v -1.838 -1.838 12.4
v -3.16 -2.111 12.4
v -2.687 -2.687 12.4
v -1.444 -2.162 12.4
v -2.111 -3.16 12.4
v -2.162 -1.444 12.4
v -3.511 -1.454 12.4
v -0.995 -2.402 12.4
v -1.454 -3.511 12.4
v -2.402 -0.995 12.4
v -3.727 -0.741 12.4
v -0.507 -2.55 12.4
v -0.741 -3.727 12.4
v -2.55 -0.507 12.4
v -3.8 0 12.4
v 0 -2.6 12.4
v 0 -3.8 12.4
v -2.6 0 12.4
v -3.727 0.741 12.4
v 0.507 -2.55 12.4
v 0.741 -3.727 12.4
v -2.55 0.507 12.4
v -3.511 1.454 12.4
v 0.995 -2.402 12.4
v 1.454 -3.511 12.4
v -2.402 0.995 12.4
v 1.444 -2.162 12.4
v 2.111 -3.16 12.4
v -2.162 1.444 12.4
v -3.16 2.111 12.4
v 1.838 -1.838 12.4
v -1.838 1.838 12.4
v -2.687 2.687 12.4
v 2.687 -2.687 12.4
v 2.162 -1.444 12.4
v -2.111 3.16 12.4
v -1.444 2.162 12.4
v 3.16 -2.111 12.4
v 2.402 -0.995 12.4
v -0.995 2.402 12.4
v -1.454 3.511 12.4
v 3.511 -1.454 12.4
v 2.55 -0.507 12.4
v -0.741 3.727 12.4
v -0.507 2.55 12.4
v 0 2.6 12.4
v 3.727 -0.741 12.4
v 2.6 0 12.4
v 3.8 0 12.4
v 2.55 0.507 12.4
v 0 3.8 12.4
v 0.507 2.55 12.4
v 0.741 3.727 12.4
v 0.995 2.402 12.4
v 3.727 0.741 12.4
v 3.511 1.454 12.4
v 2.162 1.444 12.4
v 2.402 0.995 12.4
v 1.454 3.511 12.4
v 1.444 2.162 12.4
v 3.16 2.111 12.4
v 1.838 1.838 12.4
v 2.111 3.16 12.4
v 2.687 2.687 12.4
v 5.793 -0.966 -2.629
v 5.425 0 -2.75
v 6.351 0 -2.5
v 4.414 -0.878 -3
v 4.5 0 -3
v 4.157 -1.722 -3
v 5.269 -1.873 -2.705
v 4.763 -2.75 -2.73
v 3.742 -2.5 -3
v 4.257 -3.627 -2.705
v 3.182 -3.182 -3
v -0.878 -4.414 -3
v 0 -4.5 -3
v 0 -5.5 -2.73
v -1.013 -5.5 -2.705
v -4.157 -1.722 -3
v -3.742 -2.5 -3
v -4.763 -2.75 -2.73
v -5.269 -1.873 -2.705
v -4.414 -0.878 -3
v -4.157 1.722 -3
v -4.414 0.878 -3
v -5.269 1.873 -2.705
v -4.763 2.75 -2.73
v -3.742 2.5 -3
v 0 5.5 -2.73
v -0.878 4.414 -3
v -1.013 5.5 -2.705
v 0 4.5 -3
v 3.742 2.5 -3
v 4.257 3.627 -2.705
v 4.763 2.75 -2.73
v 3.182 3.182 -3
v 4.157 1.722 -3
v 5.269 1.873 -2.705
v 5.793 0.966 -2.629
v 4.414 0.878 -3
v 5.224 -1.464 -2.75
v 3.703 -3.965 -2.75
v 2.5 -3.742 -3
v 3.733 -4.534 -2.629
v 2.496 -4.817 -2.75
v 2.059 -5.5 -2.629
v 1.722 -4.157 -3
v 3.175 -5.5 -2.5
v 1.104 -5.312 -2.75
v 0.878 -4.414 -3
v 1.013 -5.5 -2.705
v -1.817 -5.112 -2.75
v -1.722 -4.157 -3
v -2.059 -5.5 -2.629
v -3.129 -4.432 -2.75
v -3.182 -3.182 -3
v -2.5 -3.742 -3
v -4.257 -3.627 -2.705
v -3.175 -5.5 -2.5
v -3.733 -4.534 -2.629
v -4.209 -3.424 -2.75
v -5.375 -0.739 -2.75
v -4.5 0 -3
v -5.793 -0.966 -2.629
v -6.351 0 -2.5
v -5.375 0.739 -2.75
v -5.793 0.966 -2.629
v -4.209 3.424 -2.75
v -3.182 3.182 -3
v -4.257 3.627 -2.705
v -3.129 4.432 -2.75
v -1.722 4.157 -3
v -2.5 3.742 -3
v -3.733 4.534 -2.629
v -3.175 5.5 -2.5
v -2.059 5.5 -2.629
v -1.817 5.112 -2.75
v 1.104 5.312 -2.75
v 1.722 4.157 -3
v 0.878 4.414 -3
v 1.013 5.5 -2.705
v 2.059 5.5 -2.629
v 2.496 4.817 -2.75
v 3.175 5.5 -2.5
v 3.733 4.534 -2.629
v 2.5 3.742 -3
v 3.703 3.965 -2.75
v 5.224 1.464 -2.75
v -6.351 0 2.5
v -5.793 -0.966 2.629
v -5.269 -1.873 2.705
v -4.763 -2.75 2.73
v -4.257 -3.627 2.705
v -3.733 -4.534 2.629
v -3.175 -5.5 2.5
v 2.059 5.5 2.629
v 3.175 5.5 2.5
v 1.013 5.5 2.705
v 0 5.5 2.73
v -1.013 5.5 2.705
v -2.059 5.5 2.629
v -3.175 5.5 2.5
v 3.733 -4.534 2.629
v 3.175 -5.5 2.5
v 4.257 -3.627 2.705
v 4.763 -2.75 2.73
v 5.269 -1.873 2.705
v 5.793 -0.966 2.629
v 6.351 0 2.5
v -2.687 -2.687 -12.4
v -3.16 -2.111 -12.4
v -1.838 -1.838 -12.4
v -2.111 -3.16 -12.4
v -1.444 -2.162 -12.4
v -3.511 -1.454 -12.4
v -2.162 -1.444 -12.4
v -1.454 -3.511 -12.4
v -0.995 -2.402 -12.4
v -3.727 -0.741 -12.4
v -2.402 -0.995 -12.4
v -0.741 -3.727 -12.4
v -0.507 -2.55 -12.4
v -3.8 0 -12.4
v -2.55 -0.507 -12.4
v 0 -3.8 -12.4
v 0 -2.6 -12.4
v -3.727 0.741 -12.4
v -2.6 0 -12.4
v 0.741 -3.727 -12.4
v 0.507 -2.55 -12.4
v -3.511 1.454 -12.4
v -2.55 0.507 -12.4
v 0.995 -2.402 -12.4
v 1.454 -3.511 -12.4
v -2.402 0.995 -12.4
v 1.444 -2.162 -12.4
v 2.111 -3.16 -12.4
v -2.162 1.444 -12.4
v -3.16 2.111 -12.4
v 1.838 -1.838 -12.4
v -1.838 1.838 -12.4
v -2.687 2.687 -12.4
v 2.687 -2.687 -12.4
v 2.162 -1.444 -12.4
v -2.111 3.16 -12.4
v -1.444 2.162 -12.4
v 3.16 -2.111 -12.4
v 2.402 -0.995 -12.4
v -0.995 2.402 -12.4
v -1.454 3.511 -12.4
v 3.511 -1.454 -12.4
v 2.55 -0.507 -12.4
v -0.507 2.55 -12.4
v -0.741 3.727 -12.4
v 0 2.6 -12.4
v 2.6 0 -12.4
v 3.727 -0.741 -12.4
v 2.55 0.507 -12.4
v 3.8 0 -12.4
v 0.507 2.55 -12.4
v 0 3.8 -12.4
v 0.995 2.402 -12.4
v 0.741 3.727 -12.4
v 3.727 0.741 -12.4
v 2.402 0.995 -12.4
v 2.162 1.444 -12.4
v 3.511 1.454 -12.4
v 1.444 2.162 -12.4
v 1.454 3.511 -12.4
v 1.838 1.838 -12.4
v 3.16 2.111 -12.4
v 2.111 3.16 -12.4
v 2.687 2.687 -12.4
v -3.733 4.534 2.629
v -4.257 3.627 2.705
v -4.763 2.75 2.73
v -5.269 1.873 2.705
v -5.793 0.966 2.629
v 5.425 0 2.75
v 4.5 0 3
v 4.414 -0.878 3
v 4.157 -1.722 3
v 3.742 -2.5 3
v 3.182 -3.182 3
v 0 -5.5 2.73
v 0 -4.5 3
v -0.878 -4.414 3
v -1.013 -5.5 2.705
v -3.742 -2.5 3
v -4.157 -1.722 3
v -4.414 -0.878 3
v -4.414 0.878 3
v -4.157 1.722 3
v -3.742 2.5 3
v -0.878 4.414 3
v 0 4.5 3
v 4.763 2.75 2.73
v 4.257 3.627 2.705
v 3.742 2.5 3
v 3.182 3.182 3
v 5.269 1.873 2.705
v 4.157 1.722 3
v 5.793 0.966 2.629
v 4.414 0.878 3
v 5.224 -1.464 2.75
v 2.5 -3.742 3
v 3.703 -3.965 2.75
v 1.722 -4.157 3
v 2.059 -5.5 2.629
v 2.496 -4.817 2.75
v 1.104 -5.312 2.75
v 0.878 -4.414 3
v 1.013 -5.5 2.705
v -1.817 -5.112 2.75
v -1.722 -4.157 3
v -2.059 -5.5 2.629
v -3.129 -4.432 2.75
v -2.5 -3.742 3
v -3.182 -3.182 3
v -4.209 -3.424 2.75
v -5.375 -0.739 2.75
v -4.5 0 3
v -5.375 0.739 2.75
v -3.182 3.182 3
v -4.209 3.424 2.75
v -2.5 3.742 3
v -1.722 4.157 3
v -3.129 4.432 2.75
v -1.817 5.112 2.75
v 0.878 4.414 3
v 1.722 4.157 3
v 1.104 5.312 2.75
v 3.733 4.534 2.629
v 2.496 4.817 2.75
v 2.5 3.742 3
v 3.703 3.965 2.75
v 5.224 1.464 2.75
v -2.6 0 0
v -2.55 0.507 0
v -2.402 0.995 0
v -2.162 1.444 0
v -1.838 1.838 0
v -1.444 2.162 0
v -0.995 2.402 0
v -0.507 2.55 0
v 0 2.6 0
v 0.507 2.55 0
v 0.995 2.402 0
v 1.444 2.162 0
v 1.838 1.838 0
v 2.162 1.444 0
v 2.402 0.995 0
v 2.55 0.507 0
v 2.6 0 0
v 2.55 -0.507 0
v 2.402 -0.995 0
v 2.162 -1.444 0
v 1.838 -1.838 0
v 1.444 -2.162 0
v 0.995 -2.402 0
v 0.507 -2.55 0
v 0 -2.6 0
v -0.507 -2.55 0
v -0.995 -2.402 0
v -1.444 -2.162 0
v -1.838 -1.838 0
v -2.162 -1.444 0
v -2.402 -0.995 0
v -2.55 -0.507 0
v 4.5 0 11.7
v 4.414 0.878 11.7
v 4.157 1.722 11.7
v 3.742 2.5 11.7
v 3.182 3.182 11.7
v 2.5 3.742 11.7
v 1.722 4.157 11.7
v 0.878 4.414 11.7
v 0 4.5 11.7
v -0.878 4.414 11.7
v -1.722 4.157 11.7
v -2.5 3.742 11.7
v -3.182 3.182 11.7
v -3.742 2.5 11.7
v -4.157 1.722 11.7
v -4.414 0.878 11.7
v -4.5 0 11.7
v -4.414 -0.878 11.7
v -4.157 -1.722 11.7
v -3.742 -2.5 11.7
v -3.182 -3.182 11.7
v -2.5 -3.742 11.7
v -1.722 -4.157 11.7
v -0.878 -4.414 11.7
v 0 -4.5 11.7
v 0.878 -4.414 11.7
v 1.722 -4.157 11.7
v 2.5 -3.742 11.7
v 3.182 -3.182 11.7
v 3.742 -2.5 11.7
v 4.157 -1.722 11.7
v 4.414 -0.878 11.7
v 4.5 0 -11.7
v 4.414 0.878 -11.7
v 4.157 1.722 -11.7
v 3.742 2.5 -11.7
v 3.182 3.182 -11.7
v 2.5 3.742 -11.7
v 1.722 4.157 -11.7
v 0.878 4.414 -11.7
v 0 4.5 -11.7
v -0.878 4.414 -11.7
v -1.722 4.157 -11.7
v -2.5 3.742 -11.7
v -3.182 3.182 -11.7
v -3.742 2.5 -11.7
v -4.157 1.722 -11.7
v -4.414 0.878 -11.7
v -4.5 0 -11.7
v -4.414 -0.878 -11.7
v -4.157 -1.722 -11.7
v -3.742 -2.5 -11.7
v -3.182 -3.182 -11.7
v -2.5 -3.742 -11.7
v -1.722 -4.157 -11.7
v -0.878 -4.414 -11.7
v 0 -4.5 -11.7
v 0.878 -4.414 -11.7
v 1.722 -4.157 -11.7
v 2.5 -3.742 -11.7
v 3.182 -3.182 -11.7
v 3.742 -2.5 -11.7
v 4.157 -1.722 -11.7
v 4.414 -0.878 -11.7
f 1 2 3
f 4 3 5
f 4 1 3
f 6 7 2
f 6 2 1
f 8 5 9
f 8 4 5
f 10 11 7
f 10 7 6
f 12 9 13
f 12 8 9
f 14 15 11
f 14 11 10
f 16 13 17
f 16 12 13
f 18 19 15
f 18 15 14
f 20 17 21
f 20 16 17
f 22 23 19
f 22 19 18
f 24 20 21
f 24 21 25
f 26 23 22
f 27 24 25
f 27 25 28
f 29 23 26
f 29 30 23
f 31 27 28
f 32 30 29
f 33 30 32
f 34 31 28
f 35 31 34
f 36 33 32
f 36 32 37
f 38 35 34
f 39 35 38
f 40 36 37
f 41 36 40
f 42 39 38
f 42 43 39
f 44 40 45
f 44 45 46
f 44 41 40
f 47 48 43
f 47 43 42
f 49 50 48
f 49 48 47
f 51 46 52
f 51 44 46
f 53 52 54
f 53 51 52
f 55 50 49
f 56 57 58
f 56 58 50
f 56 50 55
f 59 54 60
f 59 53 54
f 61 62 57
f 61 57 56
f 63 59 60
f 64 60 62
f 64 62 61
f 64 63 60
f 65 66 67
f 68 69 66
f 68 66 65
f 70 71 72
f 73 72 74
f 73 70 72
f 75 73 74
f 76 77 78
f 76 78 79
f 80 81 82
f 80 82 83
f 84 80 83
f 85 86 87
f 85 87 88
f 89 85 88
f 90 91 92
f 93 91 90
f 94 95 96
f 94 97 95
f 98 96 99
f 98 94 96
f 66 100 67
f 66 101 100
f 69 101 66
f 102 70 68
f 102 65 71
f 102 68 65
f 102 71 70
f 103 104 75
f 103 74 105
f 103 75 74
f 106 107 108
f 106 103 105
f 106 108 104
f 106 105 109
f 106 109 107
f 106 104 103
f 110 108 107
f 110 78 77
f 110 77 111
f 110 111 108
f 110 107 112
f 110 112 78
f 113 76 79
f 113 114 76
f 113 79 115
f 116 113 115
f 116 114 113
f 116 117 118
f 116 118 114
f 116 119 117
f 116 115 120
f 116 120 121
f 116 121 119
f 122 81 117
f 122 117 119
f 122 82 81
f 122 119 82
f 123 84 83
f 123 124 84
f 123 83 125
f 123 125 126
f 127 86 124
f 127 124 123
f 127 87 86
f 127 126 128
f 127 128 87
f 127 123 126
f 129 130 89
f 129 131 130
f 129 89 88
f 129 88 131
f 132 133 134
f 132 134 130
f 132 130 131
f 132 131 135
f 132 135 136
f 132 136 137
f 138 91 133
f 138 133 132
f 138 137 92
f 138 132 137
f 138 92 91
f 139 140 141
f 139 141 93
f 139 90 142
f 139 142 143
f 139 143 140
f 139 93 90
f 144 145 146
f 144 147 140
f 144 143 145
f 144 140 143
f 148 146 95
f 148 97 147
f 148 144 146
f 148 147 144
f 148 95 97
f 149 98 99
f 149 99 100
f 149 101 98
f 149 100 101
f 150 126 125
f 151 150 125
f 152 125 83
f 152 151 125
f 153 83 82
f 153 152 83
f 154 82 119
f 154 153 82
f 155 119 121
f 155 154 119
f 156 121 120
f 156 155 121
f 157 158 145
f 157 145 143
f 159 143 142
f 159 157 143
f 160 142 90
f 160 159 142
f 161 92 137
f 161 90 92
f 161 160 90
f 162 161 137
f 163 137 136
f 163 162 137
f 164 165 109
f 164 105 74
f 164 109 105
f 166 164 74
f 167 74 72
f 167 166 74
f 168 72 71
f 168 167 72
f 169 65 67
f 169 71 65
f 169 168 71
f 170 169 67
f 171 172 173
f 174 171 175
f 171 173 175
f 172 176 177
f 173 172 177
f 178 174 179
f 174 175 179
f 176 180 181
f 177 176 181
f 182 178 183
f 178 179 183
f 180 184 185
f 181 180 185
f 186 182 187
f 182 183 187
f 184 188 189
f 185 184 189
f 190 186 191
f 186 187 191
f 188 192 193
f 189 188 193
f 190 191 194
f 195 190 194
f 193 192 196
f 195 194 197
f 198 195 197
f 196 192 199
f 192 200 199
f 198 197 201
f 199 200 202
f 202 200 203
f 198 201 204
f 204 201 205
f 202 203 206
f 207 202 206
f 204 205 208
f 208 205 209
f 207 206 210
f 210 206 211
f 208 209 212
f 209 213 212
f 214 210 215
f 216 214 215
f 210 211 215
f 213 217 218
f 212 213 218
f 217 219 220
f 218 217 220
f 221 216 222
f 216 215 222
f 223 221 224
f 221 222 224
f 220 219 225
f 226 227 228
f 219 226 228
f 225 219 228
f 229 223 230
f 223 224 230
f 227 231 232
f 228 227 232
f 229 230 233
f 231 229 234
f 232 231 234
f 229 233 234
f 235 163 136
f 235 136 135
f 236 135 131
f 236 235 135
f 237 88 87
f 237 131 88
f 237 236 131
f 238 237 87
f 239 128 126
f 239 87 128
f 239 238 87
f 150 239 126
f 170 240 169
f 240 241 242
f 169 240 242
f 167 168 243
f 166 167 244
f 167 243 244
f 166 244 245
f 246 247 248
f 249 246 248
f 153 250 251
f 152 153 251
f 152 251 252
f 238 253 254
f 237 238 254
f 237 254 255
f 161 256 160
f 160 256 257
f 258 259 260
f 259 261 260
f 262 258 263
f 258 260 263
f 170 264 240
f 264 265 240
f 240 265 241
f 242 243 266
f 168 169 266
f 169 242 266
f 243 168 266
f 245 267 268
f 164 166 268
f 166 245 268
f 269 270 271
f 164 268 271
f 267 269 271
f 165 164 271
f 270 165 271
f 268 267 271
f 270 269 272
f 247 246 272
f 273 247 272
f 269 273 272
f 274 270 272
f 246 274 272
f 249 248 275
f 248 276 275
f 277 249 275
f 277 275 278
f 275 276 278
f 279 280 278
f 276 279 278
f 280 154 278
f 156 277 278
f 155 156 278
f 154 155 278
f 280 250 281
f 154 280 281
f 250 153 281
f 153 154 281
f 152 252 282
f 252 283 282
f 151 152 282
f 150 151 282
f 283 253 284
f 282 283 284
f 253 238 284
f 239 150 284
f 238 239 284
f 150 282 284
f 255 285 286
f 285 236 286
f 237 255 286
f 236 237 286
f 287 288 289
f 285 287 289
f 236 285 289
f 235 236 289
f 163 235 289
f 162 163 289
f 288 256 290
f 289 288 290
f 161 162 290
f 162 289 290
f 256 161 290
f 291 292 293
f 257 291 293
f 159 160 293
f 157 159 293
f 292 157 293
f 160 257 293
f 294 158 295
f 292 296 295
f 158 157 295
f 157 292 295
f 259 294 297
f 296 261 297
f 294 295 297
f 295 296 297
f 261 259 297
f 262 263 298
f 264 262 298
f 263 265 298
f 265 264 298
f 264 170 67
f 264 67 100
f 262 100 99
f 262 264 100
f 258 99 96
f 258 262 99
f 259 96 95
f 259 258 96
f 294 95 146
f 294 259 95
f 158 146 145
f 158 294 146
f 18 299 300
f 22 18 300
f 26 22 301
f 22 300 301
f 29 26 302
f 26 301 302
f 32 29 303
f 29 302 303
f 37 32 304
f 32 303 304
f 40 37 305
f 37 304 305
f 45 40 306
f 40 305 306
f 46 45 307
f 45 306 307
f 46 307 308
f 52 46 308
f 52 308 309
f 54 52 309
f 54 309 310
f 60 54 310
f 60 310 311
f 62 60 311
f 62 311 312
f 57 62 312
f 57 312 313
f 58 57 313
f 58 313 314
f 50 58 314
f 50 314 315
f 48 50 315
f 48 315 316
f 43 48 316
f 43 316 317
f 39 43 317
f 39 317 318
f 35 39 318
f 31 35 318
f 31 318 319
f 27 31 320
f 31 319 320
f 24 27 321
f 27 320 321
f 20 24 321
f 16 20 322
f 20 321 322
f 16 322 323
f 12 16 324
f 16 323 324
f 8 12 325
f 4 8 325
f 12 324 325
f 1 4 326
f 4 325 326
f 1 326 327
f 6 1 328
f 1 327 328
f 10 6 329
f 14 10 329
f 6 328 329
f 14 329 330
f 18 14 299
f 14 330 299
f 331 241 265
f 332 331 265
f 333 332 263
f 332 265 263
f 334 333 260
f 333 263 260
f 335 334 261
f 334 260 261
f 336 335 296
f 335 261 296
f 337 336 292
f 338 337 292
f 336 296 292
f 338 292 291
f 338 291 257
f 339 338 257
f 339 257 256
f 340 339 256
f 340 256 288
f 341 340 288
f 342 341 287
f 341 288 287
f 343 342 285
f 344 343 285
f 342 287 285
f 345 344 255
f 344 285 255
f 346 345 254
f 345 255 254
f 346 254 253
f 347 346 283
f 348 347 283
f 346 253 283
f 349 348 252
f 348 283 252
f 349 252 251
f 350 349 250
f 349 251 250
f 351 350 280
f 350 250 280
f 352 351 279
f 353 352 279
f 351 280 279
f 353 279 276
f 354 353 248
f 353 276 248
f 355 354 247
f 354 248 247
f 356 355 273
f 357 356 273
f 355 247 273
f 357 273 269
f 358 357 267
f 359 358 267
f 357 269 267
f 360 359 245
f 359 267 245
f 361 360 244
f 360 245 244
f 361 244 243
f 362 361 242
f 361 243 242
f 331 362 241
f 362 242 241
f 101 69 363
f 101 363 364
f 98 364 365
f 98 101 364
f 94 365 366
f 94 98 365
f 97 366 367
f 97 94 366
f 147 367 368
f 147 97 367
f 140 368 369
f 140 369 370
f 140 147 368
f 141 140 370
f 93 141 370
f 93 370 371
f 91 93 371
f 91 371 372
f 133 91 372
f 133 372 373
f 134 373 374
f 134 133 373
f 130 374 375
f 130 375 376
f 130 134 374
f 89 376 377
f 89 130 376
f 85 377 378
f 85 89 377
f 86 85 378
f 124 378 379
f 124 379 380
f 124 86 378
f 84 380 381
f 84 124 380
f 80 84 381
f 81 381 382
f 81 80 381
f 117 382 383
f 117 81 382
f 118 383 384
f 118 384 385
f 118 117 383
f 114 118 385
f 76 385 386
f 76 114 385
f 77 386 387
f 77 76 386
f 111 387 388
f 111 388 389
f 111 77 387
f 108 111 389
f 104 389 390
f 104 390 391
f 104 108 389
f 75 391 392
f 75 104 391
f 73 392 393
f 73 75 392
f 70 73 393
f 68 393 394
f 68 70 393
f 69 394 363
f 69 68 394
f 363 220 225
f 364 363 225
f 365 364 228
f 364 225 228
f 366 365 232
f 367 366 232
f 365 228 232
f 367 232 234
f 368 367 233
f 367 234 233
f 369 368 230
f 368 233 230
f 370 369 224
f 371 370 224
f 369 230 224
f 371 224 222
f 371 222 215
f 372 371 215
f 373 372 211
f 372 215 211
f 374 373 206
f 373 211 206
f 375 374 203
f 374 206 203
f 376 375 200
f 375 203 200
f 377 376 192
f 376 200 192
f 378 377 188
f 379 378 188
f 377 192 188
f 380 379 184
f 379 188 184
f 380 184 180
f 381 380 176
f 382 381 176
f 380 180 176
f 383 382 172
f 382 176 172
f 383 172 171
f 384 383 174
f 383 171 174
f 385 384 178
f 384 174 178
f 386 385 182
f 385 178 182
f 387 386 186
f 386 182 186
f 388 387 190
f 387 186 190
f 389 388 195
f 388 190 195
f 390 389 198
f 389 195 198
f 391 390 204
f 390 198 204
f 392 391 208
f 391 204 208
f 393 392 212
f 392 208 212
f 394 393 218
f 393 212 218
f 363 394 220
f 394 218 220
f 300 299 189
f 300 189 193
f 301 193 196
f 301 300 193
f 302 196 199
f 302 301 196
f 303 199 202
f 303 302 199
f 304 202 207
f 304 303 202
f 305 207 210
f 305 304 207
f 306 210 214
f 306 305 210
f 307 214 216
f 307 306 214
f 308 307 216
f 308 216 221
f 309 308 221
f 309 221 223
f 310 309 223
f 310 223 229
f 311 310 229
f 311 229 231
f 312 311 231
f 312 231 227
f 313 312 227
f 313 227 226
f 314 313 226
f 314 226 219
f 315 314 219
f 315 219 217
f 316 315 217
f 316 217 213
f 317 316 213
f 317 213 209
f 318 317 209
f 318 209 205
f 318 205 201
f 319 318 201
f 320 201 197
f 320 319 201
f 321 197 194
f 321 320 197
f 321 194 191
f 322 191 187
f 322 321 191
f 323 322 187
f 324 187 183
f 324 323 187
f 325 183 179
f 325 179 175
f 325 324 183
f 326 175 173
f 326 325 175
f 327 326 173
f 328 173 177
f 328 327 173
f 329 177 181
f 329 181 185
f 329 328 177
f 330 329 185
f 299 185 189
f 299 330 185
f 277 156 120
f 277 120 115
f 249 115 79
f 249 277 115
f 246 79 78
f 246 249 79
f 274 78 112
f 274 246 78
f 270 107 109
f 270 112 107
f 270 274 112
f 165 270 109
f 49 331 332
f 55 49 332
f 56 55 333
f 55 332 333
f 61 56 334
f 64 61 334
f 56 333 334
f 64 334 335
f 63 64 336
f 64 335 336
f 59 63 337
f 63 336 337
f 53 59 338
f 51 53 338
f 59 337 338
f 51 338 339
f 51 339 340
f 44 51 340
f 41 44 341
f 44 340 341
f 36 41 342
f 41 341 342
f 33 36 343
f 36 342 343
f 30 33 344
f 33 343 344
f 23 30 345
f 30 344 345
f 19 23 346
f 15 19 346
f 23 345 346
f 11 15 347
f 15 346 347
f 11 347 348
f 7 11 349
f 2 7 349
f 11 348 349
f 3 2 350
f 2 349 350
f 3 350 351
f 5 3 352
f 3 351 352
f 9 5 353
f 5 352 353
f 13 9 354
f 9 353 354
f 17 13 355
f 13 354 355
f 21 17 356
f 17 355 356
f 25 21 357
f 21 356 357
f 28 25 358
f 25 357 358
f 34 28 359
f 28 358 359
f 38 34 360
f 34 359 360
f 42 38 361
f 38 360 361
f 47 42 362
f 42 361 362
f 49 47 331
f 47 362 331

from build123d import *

# Parameters (mm, degrees)
BOSS_EXTRUDE1_DEPTH = 3
SKETCH2_R           = 4.5
BOSS_EXTRUDE2_DEPTH = 9.4
SKETCH3_R           = 2.6
CUT_EXTRUDE1_DEPTH  = 15.978095117
CHAMFER2_SIZE       = 0.7


with BuildPart() as part:
    # Sketch1 → Boss-Extrude1 (new body)
    with BuildSketch(Plane.XY):
        Polygon((6.350852961, 0), (3.175426481, 5.5), (-3.175426481, 5.5), (-6.350852961, 0), (-3.175426481, -5.5), (3.175426481, -5.5), align=None)
    boss_extrude1 = extrude(amount=BOSS_EXTRUDE1_DEPTH)

    # Sketch2 → Boss-Extrude2 (add)
    with BuildSketch(Plane.XY.offset(3)):
        Circle(SKETCH2_R)
    boss_extrude2 = extrude(amount=BOSS_EXTRUDE2_DEPTH)

    # Sketch3 → Cut-Extrude1 (cut, through all)
    with BuildSketch(Plane(origin=(0, 0, 0), x_dir=(-1, 0, 0), z_dir=(0, 0, -1))):
        Circle(SKETCH3_R)
    cut_extrude1 = extrude(amount=-CUT_EXTRUDE1_DEPTH, mode=Mode.SUBTRACT)

    # Sketch5 → Cut-Revolve2 (revolve, cut)
    with BuildSketch(Plane(origin=(0, 0, 0), x_dir=(1, 0, 0), z_dir=(0, 1, 0))):
        Polygon((-4.5, -3), (-6.350852961, -3), (-6.350852961, -2.5), align=None)
    cut_revolve2 = revolve(axis=Axis((0, 0, 12.4), (0, 0, -1)), mode=Mode.SUBTRACT)

    # Mirror3: Boss-Extrude1, Boss-Extrude2, Cut-Extrude1, Cut-Revolve2 across plane
    add(boss_extrude1.mirror(Plane.XY))
    add(boss_extrude2.mirror(Plane.XY))
    add(cut_extrude1.mirror(Plane.XY), mode=Mode.SUBTRACT)
    add(cut_revolve2.mirror(Plane.XY), mode=Mode.SUBTRACT)

    # Chamfer2
    chamfer2_edges = [part.edges().sort_by_distance(p)[0] for p in [
        (-4.5, 0, -12.4),
        (-4.5, 0, 12.4),
    ]]
    chamfer(chamfer2_edges, length=CHAMFER2_SIZE)


solid = part.part
